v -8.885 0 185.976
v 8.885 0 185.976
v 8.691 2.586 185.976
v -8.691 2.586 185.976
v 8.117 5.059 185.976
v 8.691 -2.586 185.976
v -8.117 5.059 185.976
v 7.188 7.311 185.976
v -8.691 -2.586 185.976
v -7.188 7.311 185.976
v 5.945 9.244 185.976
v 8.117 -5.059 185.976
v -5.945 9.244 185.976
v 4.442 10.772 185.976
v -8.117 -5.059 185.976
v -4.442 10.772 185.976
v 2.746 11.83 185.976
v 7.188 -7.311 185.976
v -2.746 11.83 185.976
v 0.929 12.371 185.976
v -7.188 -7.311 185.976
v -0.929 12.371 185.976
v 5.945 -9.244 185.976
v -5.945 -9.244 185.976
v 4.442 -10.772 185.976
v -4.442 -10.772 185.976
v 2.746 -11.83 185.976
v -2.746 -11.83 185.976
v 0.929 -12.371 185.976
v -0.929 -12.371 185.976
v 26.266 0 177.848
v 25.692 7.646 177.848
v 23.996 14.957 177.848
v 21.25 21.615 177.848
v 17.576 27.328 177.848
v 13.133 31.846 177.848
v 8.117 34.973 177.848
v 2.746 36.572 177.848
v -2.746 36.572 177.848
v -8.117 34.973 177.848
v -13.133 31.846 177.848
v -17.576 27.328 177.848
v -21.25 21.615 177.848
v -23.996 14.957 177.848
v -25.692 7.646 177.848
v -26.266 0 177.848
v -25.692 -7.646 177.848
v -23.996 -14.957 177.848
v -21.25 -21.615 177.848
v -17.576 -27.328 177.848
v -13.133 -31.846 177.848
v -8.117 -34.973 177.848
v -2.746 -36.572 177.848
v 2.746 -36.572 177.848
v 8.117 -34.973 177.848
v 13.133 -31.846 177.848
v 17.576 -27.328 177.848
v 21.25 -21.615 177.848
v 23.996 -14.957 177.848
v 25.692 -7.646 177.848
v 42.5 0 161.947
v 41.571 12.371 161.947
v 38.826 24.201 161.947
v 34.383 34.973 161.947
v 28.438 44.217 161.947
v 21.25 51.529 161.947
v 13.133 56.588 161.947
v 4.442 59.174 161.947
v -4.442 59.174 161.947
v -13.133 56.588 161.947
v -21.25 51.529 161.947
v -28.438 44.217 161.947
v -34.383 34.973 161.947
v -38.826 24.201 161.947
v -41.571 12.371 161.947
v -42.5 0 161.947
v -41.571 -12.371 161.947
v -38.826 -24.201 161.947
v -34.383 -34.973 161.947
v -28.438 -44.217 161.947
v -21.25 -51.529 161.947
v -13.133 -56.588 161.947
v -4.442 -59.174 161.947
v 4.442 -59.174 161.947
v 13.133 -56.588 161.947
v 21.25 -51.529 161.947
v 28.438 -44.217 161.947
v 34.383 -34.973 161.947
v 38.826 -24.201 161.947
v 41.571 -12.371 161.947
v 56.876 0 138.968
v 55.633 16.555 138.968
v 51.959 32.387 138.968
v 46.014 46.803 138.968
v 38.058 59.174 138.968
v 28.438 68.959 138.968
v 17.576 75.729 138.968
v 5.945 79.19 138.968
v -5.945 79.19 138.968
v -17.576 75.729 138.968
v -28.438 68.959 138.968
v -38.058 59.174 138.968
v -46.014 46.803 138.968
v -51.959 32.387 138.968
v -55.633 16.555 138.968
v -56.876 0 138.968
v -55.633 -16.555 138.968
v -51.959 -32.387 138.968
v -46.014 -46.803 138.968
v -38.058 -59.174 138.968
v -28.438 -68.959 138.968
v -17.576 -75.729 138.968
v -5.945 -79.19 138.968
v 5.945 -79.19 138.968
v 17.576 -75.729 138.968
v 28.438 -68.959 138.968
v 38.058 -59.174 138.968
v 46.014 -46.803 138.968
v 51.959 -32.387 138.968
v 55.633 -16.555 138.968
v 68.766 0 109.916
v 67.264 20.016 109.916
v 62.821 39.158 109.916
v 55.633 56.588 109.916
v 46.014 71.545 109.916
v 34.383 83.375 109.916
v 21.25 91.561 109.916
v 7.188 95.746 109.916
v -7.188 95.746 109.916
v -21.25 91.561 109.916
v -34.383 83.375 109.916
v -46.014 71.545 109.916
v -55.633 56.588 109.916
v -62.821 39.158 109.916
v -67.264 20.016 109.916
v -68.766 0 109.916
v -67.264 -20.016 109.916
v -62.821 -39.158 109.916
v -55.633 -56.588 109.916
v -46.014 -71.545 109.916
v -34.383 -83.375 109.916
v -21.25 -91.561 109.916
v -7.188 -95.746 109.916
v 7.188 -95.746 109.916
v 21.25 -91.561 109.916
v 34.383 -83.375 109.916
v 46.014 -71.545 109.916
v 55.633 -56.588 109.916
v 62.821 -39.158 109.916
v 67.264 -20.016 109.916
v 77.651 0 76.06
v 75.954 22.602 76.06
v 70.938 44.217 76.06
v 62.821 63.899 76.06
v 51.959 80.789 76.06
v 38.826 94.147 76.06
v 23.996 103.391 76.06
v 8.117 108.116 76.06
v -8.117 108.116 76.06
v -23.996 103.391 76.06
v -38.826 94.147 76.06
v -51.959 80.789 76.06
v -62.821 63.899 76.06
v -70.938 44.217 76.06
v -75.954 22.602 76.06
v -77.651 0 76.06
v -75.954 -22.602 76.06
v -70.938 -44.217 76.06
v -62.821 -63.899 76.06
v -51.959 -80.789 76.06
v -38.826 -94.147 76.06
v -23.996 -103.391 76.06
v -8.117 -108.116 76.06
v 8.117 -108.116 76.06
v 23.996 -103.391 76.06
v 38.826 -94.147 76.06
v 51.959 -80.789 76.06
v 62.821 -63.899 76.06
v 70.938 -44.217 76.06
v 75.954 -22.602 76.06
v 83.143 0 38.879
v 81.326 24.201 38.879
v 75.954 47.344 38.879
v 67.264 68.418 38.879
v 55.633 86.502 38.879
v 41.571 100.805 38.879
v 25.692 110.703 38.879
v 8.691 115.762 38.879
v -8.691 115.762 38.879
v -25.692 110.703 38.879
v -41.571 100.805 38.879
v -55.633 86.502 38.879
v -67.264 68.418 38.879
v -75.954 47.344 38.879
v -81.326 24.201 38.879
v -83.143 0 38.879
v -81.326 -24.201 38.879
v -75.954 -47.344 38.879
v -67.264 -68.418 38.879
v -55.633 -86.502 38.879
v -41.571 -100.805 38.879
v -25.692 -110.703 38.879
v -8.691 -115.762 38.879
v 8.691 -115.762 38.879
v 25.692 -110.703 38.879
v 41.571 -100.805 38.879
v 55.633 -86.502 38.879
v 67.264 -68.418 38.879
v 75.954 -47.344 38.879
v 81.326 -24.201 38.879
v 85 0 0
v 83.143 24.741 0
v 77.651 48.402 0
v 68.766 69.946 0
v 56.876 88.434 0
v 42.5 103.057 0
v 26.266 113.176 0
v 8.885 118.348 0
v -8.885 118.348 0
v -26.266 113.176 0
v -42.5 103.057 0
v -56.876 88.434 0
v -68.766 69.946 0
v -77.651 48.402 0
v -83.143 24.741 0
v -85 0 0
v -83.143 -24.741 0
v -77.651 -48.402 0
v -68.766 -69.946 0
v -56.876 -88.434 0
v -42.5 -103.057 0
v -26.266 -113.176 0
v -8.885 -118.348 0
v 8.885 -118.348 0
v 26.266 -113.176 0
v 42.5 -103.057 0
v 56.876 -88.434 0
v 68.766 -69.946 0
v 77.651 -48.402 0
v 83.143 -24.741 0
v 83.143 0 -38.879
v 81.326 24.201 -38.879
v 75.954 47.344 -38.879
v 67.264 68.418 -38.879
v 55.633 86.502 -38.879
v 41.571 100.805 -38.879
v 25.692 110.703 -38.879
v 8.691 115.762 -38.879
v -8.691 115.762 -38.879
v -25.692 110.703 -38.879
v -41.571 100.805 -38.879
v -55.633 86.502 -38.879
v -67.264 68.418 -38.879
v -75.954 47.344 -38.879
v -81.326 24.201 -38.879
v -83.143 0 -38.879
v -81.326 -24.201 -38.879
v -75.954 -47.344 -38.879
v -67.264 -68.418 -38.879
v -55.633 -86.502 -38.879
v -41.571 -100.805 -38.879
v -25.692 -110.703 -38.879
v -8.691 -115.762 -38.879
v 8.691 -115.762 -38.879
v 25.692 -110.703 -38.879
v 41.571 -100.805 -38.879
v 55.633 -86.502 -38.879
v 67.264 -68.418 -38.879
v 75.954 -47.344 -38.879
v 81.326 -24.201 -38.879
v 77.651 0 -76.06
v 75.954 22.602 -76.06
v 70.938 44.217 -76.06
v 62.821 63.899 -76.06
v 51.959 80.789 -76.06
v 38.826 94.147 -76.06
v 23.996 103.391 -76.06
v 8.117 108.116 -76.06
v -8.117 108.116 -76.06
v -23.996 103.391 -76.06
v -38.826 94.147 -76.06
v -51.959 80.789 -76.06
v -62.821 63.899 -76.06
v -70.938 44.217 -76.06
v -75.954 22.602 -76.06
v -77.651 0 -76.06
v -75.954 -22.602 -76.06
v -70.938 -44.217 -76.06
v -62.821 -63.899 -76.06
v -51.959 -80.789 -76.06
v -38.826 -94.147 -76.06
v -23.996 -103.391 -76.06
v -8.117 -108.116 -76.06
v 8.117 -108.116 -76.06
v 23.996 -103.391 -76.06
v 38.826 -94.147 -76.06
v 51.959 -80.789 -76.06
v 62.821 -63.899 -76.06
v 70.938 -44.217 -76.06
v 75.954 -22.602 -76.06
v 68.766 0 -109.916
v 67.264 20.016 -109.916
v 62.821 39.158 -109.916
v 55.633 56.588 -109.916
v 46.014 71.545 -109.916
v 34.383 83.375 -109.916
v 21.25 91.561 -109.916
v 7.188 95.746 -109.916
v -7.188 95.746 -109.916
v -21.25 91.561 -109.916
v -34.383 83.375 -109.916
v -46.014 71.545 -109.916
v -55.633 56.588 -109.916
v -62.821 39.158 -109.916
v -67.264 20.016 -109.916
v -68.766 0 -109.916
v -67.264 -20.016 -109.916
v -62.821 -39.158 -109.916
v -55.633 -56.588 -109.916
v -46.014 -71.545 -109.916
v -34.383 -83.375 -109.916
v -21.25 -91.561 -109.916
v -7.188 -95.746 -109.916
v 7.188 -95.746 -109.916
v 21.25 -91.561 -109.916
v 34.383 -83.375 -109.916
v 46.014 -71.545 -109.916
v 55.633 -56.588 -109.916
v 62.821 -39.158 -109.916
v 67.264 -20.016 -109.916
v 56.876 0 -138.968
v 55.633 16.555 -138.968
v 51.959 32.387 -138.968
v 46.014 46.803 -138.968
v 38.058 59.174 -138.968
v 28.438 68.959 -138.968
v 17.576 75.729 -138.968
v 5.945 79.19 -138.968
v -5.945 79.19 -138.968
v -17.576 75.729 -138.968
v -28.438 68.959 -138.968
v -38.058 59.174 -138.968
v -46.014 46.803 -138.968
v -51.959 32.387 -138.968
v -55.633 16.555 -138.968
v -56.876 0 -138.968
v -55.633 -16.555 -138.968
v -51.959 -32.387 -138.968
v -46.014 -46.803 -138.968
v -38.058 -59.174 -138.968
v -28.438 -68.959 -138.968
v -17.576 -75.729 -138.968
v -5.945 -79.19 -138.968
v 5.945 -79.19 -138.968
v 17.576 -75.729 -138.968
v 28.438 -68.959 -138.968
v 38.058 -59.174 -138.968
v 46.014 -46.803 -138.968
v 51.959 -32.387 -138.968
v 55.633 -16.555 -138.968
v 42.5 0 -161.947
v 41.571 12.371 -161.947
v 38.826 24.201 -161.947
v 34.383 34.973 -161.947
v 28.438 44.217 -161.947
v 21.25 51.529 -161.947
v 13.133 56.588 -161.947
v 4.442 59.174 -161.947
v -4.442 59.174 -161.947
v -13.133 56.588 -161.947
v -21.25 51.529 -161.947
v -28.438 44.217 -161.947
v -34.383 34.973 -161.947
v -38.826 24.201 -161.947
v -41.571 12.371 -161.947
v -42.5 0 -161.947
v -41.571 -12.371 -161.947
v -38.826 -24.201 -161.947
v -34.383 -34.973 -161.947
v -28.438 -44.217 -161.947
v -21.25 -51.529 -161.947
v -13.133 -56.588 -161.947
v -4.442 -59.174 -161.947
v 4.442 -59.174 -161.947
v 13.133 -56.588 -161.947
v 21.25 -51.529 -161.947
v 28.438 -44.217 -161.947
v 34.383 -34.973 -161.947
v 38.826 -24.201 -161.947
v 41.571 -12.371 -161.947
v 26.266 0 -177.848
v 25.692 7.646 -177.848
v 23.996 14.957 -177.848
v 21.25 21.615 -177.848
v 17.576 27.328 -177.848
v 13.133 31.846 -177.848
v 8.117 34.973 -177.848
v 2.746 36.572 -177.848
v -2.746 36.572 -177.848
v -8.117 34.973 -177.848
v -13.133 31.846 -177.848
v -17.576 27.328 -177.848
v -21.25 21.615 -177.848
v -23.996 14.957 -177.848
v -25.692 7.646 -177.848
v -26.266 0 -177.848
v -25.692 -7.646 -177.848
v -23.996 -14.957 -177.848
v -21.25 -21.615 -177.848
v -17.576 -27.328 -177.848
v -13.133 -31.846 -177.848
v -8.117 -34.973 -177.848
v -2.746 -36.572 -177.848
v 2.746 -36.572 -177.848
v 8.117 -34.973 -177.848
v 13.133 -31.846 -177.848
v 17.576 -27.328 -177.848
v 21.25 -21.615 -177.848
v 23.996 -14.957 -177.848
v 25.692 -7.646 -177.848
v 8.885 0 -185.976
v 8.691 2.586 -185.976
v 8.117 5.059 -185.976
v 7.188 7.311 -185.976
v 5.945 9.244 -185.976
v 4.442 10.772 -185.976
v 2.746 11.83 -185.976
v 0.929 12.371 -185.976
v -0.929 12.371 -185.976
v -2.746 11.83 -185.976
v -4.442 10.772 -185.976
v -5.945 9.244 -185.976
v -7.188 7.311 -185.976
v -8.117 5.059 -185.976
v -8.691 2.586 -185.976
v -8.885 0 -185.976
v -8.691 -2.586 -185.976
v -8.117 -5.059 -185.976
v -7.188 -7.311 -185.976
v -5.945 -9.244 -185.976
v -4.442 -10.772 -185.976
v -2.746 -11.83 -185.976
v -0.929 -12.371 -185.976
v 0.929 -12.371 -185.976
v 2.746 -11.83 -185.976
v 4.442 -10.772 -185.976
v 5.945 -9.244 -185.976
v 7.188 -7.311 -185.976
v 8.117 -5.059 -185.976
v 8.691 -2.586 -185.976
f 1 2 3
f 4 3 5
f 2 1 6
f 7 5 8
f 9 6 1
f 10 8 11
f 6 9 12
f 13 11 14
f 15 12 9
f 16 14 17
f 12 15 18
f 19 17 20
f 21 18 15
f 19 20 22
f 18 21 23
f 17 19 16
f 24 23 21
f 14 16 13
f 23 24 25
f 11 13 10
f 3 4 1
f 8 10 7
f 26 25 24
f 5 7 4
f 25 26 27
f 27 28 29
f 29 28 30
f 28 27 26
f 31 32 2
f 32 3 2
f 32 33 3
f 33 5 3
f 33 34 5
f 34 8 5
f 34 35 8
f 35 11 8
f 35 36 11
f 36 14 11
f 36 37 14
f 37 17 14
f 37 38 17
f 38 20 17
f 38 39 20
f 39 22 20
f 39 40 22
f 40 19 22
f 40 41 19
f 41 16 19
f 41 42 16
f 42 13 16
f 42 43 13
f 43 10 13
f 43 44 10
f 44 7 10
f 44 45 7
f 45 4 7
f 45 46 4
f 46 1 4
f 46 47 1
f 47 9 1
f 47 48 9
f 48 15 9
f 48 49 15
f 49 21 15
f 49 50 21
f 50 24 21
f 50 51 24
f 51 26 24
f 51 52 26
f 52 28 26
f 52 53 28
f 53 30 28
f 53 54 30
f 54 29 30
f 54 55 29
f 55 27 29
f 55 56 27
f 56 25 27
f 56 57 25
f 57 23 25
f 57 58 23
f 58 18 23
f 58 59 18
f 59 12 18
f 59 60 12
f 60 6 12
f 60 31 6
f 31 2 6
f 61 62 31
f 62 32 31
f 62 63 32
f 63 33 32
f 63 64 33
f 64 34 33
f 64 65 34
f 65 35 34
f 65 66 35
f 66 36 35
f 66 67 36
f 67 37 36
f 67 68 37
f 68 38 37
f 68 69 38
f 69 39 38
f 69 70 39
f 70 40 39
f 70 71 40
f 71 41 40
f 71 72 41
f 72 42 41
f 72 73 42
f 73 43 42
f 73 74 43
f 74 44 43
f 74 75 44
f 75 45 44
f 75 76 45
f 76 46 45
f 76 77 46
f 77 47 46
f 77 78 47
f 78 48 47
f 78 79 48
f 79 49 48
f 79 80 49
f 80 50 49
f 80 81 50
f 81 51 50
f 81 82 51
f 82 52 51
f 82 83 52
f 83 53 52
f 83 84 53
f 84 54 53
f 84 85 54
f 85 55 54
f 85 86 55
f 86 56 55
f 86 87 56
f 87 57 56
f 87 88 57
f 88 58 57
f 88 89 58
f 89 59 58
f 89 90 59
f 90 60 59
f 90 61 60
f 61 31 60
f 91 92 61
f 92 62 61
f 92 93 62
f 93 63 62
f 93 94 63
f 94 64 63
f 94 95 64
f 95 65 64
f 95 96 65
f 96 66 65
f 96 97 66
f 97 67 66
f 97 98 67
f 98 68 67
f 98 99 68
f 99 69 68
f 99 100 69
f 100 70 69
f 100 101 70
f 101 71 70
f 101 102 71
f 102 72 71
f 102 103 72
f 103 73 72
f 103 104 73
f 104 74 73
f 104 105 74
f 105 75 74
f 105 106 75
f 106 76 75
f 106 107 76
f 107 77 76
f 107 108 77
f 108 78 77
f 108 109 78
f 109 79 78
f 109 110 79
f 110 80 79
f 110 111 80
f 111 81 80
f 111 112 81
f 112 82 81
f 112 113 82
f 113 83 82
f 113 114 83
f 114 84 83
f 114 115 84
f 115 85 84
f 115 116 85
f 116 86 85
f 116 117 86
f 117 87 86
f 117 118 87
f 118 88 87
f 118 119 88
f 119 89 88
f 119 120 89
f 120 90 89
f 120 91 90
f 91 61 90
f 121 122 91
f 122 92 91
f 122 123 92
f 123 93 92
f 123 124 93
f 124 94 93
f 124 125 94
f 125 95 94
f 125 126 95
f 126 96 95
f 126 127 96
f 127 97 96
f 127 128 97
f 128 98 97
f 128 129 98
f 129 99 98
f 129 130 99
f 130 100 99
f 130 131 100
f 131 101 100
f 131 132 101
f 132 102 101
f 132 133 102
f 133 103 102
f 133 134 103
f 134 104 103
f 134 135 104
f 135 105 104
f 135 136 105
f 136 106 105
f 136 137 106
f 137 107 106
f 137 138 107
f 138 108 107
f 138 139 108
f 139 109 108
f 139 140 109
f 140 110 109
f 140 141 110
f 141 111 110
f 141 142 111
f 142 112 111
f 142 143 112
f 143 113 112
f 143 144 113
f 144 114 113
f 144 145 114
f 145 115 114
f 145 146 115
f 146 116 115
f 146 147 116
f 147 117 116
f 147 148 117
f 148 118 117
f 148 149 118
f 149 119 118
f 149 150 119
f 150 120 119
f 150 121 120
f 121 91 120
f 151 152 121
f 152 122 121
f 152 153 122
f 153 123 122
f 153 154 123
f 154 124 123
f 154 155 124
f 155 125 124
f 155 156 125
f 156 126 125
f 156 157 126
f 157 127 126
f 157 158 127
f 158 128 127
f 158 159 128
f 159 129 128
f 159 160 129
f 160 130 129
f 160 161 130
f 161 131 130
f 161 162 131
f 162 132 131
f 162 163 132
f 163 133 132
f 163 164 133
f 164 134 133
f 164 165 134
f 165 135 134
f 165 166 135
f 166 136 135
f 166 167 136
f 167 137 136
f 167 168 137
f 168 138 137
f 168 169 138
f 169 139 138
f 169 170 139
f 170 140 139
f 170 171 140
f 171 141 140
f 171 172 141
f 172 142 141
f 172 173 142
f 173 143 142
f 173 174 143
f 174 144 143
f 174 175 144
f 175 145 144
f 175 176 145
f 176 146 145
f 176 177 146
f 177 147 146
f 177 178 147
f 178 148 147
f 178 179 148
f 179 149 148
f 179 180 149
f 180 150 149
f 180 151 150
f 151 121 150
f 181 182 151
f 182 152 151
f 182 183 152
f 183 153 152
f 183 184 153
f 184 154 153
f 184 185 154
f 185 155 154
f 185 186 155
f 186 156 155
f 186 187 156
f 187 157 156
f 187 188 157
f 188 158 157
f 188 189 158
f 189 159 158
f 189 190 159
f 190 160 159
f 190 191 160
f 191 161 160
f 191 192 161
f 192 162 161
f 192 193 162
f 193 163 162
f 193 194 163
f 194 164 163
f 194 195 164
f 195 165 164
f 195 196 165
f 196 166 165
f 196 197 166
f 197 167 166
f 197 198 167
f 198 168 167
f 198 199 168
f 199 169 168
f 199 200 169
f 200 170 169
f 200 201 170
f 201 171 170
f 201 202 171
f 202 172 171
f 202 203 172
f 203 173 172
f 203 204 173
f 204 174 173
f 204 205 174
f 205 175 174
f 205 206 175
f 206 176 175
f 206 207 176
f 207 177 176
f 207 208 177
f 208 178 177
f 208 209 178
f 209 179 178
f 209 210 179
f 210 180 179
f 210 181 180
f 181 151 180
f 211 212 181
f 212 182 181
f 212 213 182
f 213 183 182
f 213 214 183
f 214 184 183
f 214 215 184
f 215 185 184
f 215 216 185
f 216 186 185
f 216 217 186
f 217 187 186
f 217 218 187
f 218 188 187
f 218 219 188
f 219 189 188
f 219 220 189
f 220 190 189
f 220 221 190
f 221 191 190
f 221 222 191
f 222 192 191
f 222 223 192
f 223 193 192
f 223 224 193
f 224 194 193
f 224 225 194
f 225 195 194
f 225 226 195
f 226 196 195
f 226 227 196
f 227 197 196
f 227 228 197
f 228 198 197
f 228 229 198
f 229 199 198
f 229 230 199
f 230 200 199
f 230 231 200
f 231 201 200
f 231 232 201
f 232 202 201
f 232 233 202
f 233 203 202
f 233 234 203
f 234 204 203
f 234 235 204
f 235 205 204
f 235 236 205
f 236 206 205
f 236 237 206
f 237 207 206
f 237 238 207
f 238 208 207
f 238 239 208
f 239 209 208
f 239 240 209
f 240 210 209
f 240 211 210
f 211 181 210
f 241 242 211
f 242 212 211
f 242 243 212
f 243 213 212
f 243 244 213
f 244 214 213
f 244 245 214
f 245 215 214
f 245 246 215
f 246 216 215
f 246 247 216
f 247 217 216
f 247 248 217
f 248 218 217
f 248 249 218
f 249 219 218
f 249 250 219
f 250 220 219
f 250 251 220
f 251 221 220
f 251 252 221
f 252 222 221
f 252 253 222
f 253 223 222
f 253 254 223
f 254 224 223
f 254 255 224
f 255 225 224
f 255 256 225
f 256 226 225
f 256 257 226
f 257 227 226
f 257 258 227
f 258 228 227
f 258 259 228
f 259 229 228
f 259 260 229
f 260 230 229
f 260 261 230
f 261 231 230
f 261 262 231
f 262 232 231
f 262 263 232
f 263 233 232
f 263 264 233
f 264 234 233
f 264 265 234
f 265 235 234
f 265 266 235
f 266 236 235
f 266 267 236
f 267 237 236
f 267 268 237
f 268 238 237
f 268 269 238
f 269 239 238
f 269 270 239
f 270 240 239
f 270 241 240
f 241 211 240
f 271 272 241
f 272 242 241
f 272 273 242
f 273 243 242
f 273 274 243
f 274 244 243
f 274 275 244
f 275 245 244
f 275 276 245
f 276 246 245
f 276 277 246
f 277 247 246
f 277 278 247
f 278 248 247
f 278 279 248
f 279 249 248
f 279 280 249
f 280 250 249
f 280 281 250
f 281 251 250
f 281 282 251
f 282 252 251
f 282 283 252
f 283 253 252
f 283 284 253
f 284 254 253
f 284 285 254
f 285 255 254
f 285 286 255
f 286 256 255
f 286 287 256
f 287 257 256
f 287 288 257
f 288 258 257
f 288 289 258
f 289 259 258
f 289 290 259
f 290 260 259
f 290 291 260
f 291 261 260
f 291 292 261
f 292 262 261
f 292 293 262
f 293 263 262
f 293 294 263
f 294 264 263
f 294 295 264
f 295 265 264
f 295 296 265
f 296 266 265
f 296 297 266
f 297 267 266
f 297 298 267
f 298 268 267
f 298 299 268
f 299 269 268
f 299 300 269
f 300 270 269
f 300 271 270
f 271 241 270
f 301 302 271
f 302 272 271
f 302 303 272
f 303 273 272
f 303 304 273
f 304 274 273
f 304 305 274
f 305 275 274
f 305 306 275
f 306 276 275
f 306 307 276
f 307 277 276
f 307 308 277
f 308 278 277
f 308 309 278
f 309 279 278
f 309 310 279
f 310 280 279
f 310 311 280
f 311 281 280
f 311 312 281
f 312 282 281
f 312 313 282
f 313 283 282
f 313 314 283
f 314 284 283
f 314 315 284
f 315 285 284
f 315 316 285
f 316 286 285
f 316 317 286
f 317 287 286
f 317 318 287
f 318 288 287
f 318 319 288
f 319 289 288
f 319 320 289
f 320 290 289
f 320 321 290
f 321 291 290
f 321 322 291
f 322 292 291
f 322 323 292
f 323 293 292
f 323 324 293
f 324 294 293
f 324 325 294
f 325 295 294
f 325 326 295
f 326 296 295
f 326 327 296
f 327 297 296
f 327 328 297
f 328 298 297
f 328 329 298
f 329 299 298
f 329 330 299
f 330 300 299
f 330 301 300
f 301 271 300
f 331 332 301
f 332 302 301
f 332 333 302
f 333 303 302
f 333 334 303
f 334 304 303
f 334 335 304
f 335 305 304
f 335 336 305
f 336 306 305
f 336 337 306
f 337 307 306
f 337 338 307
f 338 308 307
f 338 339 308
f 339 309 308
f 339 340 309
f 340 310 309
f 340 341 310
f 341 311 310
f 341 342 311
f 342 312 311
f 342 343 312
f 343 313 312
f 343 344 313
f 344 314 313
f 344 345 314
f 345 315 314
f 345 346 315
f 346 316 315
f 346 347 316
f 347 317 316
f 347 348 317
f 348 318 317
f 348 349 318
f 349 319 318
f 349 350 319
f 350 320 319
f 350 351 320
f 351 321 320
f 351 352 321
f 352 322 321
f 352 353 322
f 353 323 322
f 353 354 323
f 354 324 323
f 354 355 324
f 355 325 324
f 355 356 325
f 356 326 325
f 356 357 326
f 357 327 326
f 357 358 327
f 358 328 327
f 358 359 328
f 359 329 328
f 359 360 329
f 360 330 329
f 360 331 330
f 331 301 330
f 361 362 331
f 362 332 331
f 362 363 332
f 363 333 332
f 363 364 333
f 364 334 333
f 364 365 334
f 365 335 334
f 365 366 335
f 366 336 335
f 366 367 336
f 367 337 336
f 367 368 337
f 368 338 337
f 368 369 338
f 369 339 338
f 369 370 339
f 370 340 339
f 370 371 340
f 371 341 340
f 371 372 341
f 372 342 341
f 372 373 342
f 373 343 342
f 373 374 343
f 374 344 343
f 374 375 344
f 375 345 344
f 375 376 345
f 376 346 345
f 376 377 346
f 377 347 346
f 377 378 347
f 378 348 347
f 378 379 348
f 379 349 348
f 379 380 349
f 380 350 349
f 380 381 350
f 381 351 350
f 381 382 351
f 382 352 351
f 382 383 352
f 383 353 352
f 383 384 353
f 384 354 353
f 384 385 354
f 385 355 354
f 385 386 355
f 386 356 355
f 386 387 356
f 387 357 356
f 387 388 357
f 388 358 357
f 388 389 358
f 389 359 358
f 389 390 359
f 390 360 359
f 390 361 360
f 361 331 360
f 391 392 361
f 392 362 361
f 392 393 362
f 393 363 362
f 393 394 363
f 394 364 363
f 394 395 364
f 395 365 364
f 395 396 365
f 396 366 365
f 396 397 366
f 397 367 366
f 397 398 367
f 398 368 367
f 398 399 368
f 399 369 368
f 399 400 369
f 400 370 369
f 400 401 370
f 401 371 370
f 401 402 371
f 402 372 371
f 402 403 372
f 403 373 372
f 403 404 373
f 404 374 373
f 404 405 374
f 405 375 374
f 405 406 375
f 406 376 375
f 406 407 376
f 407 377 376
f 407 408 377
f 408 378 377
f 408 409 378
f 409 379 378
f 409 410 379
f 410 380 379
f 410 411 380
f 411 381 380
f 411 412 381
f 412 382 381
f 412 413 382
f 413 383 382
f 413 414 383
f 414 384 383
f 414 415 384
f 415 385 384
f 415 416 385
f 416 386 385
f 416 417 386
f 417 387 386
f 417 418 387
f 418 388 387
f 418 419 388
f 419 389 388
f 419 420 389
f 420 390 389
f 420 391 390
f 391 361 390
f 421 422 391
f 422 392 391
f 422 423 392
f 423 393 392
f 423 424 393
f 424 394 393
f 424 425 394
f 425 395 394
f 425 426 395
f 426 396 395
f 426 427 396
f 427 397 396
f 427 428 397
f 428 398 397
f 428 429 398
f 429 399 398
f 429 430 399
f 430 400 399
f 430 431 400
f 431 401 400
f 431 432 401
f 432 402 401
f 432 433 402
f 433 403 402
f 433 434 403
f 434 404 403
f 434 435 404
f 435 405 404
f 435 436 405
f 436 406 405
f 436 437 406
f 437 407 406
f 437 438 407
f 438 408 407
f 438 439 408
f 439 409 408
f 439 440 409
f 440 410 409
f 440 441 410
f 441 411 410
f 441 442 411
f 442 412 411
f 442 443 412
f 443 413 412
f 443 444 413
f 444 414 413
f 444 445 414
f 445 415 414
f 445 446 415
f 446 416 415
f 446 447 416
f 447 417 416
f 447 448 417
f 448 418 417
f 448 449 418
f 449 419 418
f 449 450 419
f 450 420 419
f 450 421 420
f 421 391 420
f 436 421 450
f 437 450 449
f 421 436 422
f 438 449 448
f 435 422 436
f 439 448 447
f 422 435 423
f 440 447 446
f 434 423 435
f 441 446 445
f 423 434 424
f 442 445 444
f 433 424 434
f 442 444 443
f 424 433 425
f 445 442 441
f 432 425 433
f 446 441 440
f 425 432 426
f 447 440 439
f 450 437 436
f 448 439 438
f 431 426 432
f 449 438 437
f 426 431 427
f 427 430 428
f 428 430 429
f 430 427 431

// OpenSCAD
// Generated by SolidPython 1.0.1 on 2020-07-29 00:39:26


scale(v = [5, 7, 11]) {
	sphere(r = 17);
}
/***********************************************
*********      SolidPython code:      **********
************************************************
 
# import packages: SolidPython
from solid import *
from solid.utils import *
from itertools import chain, combinations


class Resize:

    def __init__(self, scad_file):
        self.scad_file = scad_file
        #self.scad_file = import_scad(scad_file)
        # cone/cylinder param:
        self.r1 = 0
        self.r2 = 0
        self.h = 0
        # rectangular prism param:
        self.w = 0
        self.l = 0
        # ellipse param:
        self.r = 0

    # import OpenScad code (file name corresponds to shape)


    # classify shape + parameters
    def assign(self, param1, param2, param3):
        if self.scad_file == 'cone.scad':
            self.r1 = param1
            self.r2 = param2
            self.h = param3
        elif self.scad_file == 'cylinder.scad':
            self.r1 = param1
            self.r2 = param2
            self.h = param3
        elif self.scad_file == 'rectangularPrism.scad':
            self.h = param1
            self.l = param2
            self.w = param3
        else:
            self.r = param1
            self.h = param2

    # resize parameters
    def iterate(self):
        x = range(3, 20, 2)
        i = 1
        if self.scad_file == 'cone.scad':
            tempList = list(combinations(x, 2))
            for temp in tempList:
                param1 = temp[0]
                param2 = temp[1]
                filepath = 'produced_scad_files/' + 'cone' + str(param1) + '_' + str(param2) + '_' + '.scad'
                scad_render_to_file(cylinder(h=param1, r1=param2, r2=0), filepath)

        elif self.scad_file == 'cylinder.scad':
            tempList = list(combinations(x, 3))
            for temp in tempList:
                param1 = temp[0]
                param2 = temp[1]
                filepath = 'produced_scad_files/' + 'cylinder' + str(param1) + '_' + str(param2) + '_' + '.scad'
                scad_render_to_file(cylinder(h=param1, r1=param2, r2=param2), filepath)

        elif self.scad_file == 'rectangularPrism.scad':
            tempList = list(combinations(x, 3))
            for temp in tempList:
                param1 = temp[0]
                param2 = temp[1]
                param3 = temp[2]
                filepath = 'produced_scad_files/' + 'rectangularPrism' + str(param1) + '_' + str(param2) + '_' + str(
                    param3) + '.scad'
                scad_render_to_file(cube(size=(param1, param2, param3)), filepath)

        elif self.scad_file == 'ellipse.scad':
            tempList = list(combinations(x, 4))
            for temp in tempList:
                param1 = temp[0]
                param2 = temp[1]
                param3 = temp[2]
                param4 = temp[3]
                filepath = 'produced_scad_files/' + 'ellipse' + str(param1) + '_' + str(param2) + '_' + str(param3) + '_' + str(param4) + '.scad'
                scad_render_to_file(scale([param1, param2, param3])(sphere(r=param4)), filepath)

    def render_to_scadfile(self):
        scad_render_to_file(scad, 'example.scad') 
 
************************************************/
